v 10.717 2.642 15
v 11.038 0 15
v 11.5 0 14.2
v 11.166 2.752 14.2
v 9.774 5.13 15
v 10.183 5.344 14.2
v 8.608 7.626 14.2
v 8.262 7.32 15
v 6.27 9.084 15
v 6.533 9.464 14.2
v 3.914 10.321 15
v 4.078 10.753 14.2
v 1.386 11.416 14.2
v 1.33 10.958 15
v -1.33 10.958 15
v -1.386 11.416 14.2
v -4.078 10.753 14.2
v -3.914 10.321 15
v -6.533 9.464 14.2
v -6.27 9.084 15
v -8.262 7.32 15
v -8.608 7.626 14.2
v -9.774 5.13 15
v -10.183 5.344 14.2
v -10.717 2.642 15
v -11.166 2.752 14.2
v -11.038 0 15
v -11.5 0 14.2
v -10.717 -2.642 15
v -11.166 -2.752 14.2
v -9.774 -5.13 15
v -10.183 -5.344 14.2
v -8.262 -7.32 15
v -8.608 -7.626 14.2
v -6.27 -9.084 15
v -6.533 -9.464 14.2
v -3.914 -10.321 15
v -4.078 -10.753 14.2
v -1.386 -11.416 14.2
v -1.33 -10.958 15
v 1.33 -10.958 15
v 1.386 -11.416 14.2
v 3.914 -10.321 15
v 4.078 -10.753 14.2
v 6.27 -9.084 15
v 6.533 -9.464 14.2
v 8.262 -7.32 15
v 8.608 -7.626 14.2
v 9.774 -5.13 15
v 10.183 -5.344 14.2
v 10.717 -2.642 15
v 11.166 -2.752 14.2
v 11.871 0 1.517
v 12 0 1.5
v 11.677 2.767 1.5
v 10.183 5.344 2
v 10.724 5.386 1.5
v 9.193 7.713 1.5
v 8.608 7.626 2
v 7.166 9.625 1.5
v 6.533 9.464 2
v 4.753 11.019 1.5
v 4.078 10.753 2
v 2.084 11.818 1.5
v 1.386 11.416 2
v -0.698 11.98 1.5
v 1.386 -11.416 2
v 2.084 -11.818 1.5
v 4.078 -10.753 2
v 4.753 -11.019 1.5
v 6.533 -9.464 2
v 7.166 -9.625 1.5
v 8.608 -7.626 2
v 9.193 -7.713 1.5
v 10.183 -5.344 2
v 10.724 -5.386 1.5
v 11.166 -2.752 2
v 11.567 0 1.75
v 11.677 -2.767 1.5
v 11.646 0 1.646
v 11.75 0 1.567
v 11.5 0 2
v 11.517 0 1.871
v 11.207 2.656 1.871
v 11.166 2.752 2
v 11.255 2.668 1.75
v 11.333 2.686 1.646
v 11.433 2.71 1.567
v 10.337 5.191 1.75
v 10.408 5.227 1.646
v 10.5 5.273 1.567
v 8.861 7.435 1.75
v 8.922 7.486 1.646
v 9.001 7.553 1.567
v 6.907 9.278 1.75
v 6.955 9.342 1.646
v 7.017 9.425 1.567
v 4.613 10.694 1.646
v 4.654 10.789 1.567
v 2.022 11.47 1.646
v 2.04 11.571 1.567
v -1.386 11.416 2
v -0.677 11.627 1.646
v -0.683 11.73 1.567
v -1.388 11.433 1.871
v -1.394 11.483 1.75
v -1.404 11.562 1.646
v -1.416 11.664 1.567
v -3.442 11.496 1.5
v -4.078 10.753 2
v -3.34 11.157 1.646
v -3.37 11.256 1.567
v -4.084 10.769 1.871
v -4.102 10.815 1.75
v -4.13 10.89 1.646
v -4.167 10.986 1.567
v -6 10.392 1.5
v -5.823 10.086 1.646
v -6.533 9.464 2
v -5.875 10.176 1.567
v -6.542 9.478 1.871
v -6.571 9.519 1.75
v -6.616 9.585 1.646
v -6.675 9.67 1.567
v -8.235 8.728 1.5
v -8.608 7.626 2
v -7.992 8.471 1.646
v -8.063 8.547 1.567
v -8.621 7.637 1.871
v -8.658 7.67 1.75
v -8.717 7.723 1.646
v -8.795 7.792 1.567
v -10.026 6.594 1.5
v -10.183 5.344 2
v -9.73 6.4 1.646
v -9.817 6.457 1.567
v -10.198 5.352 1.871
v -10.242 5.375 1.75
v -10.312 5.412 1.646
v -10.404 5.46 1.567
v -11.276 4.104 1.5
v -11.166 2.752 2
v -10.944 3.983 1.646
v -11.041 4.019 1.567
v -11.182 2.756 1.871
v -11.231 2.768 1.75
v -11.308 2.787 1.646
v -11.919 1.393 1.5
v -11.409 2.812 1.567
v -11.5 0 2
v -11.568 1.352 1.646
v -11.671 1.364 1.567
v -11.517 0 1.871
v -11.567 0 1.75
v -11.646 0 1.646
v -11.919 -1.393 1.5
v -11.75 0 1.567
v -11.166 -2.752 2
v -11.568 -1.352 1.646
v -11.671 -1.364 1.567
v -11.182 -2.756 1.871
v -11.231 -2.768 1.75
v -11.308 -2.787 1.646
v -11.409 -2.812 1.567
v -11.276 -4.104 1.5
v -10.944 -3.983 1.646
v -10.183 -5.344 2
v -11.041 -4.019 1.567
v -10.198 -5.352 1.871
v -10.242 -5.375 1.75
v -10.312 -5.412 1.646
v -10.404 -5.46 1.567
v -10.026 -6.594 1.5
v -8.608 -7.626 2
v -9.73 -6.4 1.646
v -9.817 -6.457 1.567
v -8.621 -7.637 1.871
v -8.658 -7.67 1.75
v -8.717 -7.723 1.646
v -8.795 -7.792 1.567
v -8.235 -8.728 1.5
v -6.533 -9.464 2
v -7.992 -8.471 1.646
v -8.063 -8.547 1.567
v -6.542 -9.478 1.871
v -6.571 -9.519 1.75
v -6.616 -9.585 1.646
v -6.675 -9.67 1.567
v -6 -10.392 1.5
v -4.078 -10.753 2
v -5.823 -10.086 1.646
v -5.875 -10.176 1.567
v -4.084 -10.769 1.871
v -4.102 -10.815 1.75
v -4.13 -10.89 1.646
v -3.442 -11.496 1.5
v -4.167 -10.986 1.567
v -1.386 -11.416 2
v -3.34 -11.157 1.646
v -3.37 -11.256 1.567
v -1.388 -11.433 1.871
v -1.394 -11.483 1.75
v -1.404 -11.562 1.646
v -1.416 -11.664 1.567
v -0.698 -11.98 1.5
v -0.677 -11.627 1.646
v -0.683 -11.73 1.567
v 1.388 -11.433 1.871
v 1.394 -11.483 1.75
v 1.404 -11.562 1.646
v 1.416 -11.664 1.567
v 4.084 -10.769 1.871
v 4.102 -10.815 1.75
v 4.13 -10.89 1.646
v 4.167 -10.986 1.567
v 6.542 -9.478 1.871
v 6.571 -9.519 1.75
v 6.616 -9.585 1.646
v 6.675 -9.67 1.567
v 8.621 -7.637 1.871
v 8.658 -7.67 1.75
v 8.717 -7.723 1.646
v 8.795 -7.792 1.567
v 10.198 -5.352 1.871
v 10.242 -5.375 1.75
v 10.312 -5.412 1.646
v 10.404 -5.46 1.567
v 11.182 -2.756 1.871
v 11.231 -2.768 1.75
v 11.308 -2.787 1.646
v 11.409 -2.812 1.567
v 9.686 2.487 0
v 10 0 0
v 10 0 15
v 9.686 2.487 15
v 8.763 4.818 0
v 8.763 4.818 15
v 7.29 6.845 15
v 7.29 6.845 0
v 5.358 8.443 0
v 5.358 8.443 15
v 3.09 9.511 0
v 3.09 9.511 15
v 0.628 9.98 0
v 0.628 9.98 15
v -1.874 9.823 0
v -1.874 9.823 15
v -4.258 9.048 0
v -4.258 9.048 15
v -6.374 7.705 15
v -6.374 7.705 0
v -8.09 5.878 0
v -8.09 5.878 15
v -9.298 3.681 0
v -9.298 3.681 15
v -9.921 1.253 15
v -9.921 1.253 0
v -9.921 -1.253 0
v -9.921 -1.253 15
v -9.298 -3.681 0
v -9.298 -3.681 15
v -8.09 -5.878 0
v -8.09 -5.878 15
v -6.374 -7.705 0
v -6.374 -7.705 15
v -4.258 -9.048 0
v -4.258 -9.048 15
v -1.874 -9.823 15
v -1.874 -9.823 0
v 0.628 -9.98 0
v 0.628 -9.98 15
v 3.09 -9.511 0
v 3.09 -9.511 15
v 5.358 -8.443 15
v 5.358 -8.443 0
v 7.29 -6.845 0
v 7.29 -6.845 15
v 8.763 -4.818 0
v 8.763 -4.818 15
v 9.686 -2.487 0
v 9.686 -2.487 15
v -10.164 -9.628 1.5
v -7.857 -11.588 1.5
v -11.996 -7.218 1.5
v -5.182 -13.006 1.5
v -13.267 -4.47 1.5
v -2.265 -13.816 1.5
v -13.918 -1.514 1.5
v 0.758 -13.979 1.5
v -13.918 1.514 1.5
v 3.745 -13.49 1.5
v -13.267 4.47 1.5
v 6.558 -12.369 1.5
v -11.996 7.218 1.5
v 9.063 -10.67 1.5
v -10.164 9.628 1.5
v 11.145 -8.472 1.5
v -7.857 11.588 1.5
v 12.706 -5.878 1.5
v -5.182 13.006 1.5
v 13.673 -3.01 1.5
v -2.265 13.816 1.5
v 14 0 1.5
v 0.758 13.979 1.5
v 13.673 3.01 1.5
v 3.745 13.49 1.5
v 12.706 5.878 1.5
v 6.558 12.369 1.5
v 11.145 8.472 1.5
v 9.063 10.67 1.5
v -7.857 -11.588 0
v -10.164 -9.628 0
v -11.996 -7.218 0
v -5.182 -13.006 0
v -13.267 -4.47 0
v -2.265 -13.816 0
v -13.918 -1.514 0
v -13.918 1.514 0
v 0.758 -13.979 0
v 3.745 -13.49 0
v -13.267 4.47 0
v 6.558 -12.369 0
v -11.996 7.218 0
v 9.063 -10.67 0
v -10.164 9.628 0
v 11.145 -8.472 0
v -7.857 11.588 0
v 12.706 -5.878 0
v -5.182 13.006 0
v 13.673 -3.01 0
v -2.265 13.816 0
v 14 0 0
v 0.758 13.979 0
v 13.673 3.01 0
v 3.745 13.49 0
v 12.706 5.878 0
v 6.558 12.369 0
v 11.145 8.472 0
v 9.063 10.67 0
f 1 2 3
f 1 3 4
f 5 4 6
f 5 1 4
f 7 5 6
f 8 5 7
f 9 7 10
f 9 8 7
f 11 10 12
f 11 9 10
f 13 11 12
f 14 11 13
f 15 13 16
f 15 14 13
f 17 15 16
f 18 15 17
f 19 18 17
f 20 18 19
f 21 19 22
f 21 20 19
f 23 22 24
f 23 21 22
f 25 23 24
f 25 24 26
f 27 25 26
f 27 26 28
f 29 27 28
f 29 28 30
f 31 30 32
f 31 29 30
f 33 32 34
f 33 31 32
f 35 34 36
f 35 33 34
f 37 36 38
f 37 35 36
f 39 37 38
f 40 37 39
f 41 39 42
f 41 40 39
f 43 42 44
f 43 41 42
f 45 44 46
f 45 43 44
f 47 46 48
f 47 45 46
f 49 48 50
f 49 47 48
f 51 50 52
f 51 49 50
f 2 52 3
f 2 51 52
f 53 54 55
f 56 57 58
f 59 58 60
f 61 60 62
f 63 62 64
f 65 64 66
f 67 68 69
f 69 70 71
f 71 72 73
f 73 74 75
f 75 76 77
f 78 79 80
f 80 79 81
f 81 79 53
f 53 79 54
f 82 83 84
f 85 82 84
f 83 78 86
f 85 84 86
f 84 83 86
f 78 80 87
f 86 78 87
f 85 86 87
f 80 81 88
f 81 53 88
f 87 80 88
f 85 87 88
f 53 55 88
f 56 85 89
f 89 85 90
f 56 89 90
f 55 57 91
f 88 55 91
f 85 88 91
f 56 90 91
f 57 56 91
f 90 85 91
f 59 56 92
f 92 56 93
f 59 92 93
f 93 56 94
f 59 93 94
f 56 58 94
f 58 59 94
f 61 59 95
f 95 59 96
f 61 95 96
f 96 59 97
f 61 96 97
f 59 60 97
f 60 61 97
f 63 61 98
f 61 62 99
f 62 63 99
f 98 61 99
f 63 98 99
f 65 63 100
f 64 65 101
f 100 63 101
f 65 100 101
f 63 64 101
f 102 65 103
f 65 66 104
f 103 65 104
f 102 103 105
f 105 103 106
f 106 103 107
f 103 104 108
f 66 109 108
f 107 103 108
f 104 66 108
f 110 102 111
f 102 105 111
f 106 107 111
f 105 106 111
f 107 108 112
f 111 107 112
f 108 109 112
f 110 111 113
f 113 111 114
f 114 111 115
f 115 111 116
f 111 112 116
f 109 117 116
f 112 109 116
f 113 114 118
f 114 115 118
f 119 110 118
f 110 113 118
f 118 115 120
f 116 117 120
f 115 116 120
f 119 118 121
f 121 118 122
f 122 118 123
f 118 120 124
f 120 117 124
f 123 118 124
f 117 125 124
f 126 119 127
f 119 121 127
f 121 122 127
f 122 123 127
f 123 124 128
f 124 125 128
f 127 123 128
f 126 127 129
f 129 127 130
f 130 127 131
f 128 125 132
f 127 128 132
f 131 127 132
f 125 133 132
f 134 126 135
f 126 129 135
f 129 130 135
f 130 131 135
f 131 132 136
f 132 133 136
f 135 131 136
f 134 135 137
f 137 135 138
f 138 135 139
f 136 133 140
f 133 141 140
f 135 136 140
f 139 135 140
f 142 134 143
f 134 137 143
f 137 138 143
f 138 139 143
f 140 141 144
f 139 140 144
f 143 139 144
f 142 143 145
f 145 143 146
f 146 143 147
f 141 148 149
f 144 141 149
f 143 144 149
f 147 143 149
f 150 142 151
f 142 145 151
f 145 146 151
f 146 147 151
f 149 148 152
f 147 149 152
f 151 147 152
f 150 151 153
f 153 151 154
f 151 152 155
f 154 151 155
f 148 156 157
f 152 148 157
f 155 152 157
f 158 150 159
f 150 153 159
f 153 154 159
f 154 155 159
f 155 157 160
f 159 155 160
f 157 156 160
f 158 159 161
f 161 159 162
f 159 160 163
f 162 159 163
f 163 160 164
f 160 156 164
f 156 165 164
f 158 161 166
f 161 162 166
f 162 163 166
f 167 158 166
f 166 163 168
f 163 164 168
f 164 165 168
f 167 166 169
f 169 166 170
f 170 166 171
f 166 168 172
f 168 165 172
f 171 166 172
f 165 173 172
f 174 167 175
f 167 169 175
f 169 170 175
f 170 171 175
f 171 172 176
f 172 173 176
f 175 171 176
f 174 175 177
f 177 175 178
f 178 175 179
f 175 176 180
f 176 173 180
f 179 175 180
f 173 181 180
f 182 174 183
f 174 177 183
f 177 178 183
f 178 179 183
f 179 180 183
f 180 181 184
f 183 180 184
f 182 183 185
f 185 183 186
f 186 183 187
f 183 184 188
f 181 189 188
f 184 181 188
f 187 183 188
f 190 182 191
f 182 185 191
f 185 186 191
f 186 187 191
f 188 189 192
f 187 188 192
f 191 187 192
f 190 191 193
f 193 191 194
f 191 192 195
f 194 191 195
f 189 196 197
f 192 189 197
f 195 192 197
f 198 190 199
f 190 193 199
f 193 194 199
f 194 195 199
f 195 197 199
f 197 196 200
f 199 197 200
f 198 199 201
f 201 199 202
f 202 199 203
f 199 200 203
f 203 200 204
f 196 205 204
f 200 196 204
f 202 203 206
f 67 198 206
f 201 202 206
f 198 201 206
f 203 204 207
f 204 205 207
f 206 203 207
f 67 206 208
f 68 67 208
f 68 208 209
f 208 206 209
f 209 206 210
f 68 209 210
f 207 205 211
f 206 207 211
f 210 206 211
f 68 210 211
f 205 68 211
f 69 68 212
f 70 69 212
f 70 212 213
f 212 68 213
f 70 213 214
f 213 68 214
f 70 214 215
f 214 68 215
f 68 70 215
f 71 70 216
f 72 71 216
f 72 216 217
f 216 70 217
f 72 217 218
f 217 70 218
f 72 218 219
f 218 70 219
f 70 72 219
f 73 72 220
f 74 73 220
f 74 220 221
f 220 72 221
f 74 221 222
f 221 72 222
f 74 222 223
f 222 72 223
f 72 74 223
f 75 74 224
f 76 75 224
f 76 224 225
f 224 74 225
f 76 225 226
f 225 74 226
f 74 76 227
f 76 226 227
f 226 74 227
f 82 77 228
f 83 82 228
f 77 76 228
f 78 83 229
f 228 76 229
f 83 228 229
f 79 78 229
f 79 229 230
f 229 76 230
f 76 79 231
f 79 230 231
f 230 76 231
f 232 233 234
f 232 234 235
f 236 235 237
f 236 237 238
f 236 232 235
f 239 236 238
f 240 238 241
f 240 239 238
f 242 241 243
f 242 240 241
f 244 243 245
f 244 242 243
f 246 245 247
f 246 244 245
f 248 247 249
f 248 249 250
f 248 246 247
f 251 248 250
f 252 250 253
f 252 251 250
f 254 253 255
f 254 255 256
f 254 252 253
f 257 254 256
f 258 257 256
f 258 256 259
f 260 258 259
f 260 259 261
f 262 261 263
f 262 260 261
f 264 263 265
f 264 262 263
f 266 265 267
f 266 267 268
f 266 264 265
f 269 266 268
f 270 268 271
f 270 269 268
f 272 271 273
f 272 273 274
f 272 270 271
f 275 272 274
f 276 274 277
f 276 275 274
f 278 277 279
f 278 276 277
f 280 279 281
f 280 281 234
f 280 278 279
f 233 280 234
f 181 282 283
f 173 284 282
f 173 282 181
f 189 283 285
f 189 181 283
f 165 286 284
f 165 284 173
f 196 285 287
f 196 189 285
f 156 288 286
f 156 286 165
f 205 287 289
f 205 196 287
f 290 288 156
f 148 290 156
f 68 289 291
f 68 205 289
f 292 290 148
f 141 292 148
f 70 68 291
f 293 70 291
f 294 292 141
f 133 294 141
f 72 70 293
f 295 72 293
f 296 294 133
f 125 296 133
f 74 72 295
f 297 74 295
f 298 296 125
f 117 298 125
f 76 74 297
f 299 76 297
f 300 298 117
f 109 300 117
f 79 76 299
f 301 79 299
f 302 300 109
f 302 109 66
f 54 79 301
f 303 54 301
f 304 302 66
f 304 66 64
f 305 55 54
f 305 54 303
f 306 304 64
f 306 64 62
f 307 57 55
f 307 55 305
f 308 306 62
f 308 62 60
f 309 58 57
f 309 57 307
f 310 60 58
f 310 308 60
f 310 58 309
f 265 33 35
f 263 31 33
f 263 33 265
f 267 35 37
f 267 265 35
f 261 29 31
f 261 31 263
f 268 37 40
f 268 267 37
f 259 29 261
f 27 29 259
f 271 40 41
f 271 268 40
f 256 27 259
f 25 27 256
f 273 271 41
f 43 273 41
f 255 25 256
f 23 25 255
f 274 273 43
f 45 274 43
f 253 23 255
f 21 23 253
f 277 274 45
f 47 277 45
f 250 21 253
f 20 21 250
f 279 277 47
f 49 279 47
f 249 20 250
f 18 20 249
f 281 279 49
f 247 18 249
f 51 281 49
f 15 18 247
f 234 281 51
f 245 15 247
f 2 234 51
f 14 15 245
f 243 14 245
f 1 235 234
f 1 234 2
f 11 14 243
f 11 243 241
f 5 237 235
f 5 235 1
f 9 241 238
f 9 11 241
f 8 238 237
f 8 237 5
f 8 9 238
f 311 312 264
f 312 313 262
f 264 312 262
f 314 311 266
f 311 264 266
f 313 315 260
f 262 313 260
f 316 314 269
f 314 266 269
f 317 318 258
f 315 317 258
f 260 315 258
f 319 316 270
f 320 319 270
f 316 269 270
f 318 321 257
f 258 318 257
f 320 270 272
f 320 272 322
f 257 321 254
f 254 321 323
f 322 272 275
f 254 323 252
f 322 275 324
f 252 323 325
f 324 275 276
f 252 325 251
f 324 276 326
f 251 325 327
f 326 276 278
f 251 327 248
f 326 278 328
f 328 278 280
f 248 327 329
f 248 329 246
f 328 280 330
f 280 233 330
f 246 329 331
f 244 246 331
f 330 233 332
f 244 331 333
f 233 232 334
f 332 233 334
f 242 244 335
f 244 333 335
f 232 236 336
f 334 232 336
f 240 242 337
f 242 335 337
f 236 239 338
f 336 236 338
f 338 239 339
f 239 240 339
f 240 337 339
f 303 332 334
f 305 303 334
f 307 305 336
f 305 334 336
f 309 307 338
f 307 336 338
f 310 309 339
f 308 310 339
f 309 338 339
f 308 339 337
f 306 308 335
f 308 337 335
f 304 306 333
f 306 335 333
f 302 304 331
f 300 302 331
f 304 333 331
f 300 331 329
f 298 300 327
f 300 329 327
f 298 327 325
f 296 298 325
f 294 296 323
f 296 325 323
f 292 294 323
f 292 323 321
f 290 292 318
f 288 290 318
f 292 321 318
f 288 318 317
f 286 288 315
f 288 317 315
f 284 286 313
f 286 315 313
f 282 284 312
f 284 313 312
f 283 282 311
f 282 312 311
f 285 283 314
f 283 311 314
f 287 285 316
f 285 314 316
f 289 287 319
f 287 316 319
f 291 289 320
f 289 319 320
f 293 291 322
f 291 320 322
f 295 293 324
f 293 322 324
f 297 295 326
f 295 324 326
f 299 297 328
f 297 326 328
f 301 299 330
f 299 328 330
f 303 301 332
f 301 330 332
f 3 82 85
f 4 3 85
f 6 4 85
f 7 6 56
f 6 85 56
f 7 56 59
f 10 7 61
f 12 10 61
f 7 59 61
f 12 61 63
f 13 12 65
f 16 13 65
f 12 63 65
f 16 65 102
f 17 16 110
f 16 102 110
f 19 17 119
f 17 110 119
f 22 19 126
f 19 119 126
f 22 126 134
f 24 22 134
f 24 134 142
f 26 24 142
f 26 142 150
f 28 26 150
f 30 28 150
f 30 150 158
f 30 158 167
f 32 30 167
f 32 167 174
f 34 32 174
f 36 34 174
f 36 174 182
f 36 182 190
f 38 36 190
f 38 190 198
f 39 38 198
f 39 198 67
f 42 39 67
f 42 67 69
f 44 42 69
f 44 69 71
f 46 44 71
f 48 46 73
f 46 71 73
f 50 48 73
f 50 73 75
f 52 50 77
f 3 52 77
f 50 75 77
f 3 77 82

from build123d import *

# Parameters (mm, degrees)
SZKIC1_R                          = 14
SZKIC1_R_2                        = 11.5
WYCI_GNI_CIE_CIENKA_CIANKA1_DEPTH = 1.5
SZKIC2_R                          = 11.5
SZKIC2_R_2                        = 10
DODANIE_WYCI_GNI_CIE1_DEPTH       = 15
ZAOKR_GLENIE1_R                   = 0.5
SFAZOWANIE1_SIZE                  = 0.8
SFAZOWANIE1_SIZE2                 = 0.461880215


with BuildPart() as part:
    # Szkic1 → Wyciągnięcie-cienka ścianka1 (new body)
    with BuildSketch(Plane.XY):
        Circle(SZKIC1_R)
        Circle(SZKIC1_R_2, mode=Mode.SUBTRACT)
    extrude(amount=WYCI_GNI_CIE_CIENKA_CIANKA1_DEPTH)

    # Szkic2 → Dodanie-wyciągnięcie1 (add)
    with BuildSketch(Plane.XY):
        Circle(SZKIC2_R)
        Circle(SZKIC2_R_2, mode=Mode.SUBTRACT)
    extrude(amount=DODANIE_WYCI_GNI_CIE1_DEPTH)

    # Zaokrąglenie1
    zaokr_glenie1_edges = [part.edges().sort_by_distance(p)[0] for p in [
        (-11.5, 0, 1.5),
    ]]
    fillet(zaokr_glenie1_edges, radius=ZAOKR_GLENIE1_R)

    # Sfazowanie1
    sfazowanie1_edges = [part.edges().sort_by_distance(p)[0] for p in [
        (-11.5, 0, 15),
    ]]
    sfazowanie1_side = [part.faces().sort_by_distance(p)[0] for p in [
        (-11.5, 0, 8.5),
    ]]
    chamfer(sfazowanie1_edges, length=SFAZOWANIE1_SIZE, length2=SFAZOWANIE1_SIZE2, reference=sfazowanie1_side[0])


solid = part.part
